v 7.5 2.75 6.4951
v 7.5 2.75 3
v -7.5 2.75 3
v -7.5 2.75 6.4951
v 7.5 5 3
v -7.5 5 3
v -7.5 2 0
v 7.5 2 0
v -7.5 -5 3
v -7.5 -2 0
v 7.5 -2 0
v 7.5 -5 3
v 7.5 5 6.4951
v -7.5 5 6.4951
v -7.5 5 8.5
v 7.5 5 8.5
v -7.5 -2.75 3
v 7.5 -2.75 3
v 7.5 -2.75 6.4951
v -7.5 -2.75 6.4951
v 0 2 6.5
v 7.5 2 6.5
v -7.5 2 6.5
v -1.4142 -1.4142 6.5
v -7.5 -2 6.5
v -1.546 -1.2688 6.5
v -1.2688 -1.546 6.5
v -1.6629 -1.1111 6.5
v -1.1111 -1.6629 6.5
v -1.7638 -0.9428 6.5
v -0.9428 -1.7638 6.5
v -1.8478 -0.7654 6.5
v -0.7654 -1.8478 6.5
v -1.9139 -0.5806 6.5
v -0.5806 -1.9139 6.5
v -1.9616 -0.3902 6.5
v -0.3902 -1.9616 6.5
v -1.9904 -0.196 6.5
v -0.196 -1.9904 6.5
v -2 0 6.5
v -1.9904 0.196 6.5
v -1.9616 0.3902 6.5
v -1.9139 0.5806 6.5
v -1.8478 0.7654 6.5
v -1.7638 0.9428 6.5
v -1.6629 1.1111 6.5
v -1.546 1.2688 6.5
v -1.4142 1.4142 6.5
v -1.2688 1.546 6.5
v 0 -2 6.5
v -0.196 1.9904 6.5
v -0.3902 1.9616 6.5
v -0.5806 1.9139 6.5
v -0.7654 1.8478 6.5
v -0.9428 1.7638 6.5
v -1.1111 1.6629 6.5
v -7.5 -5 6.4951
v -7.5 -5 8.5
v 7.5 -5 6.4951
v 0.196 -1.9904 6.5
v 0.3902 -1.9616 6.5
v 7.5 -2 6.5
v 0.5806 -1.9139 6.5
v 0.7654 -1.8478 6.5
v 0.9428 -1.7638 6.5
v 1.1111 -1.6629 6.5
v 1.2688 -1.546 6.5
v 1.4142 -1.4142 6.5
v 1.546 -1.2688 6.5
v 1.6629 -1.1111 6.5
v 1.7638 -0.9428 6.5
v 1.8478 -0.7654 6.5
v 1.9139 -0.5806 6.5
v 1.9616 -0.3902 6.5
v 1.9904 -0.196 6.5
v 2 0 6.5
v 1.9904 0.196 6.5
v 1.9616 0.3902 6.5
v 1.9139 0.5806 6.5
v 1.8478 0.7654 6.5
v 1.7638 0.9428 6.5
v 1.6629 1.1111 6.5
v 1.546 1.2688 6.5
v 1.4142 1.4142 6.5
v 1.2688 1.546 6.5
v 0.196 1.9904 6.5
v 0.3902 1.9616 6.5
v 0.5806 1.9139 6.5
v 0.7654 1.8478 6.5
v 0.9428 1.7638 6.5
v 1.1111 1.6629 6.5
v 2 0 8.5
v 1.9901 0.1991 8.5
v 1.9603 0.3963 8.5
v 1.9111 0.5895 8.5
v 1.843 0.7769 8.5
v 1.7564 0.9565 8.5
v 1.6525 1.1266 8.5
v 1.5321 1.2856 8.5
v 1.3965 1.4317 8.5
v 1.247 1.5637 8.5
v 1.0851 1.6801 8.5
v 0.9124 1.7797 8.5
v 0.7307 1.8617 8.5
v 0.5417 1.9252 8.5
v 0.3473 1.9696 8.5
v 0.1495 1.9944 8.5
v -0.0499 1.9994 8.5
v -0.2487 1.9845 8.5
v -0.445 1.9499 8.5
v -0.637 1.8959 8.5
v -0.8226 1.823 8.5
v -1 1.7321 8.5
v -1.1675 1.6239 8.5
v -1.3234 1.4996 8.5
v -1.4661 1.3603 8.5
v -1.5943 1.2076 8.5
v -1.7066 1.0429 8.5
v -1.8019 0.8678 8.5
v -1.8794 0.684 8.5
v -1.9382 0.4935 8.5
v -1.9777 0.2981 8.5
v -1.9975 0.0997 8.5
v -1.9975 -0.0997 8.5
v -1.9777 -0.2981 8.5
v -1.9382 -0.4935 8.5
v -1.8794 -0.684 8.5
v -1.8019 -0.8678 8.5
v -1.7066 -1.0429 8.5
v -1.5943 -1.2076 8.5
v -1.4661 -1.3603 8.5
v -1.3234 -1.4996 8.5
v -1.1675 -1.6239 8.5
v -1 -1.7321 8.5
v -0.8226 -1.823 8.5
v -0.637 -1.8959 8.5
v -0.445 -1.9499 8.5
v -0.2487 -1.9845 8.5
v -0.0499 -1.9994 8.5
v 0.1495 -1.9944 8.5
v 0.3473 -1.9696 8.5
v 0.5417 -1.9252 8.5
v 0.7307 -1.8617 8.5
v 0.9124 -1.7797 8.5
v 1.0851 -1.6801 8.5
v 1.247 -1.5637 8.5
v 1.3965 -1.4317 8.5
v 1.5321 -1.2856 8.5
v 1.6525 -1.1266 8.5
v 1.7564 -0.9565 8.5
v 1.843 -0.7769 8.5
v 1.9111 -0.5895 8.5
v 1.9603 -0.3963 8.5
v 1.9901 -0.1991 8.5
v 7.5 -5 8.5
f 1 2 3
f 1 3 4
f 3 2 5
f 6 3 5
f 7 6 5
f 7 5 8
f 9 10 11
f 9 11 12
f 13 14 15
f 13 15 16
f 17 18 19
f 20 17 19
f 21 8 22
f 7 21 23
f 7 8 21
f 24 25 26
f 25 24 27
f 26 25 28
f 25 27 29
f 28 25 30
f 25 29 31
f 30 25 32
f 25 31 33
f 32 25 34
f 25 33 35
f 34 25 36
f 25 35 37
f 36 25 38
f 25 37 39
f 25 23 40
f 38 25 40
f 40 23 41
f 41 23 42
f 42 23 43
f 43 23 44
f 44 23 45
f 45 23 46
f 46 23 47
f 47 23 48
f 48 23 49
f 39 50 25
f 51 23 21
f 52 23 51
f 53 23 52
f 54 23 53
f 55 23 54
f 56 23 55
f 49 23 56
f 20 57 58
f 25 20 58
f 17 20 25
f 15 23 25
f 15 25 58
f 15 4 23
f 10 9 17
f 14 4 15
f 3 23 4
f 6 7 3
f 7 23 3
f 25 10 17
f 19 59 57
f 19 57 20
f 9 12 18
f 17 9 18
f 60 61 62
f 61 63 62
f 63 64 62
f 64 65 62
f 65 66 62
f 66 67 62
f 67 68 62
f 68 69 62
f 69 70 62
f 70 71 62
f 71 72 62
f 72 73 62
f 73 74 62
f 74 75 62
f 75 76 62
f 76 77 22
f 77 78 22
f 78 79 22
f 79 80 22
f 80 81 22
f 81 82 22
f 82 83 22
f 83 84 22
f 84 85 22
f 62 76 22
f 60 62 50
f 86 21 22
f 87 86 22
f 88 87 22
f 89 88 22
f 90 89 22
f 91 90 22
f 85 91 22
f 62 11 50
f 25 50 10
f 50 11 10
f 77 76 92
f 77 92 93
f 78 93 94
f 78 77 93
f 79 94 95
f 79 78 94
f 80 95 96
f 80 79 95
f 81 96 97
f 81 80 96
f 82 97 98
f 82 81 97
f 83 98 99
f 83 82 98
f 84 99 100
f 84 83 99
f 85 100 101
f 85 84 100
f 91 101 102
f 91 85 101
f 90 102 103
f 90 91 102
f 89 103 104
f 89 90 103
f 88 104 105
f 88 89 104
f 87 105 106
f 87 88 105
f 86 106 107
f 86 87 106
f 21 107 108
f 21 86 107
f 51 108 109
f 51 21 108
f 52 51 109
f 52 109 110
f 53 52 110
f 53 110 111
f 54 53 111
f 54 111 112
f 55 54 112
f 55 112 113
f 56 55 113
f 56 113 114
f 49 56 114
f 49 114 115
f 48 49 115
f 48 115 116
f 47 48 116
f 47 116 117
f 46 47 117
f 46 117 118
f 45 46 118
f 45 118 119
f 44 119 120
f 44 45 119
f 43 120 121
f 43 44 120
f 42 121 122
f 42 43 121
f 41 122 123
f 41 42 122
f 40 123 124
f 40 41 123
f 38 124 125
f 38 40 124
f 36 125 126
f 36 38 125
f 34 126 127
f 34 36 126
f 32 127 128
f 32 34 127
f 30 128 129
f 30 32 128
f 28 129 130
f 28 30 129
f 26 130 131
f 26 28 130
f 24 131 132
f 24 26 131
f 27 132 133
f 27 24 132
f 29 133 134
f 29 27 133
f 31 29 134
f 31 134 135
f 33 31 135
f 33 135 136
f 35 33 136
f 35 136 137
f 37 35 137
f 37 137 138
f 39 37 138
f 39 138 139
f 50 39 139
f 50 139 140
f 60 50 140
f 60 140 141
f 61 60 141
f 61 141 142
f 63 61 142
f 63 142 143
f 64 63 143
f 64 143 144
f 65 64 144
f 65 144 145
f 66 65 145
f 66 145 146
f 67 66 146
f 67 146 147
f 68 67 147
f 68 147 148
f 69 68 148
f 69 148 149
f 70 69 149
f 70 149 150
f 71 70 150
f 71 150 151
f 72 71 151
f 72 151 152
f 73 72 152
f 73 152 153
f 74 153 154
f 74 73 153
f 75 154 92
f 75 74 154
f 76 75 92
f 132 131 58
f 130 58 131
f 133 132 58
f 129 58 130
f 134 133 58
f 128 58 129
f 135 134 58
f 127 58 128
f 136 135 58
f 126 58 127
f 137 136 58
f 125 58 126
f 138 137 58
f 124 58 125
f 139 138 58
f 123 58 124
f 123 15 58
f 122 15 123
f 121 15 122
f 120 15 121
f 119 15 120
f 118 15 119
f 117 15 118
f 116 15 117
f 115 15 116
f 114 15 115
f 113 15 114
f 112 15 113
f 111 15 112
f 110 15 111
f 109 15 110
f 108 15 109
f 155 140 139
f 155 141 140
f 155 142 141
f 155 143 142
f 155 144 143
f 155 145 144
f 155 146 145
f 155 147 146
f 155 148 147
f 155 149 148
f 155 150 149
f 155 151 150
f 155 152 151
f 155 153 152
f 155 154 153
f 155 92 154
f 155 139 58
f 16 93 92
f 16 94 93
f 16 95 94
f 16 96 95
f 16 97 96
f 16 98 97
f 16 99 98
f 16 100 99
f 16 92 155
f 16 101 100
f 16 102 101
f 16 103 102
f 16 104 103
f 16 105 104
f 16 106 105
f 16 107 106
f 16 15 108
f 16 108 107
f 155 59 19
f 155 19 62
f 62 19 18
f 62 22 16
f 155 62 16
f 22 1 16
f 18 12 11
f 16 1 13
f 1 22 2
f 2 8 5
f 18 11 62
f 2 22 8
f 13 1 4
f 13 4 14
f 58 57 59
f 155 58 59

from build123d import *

# Parameters (mm, degrees)
F0_W     = 15
F0_H     = 10
F0_R     = 2
F1_DEPTH = 8.5
F2_W     = 2.25
F2_H     = 3.4951120354
F3_DEPTH = 25
F4_DEPTH = 6.5


with BuildPart() as f1:
    # F0 (on Top) → F1 (new body)
    with BuildSketch(Plane.XY):
        Rectangle(F0_W, F0_H)
        Circle(F0_R, mode=Mode.SUBTRACT)
    extrude(amount=F1_DEPTH)

    # F2 (on face) → F3 (cut)
    with BuildSketch(Plane.YZ.offset(7.5)):
        Polygon((5, 3), (2, 0), (5, 0), align=None)
        with Locations((3.875, 4.7475560177)):
            Rectangle(F2_W, F2_H)
        with Locations((-3.875, 4.7475560177)):
            Rectangle(F2_W, F2_H)
        Polygon((-5, 0), (-2, 0), (-5, 3), align=None)
    extrude(amount=-F3_DEPTH, mode=Mode.SUBTRACT)

    # F4 (cut): faces of the model
    f4_faces = [f1.faces().sort_by_distance(p)[0] for p in [
        (4.5185944257, 0, 0),
        (-4.5185944257, 0, 0),
    ]]
    extrude(f4_faces, amount=-F4_DEPTH, mode=Mode.SUBTRACT)


solid = f1.part
